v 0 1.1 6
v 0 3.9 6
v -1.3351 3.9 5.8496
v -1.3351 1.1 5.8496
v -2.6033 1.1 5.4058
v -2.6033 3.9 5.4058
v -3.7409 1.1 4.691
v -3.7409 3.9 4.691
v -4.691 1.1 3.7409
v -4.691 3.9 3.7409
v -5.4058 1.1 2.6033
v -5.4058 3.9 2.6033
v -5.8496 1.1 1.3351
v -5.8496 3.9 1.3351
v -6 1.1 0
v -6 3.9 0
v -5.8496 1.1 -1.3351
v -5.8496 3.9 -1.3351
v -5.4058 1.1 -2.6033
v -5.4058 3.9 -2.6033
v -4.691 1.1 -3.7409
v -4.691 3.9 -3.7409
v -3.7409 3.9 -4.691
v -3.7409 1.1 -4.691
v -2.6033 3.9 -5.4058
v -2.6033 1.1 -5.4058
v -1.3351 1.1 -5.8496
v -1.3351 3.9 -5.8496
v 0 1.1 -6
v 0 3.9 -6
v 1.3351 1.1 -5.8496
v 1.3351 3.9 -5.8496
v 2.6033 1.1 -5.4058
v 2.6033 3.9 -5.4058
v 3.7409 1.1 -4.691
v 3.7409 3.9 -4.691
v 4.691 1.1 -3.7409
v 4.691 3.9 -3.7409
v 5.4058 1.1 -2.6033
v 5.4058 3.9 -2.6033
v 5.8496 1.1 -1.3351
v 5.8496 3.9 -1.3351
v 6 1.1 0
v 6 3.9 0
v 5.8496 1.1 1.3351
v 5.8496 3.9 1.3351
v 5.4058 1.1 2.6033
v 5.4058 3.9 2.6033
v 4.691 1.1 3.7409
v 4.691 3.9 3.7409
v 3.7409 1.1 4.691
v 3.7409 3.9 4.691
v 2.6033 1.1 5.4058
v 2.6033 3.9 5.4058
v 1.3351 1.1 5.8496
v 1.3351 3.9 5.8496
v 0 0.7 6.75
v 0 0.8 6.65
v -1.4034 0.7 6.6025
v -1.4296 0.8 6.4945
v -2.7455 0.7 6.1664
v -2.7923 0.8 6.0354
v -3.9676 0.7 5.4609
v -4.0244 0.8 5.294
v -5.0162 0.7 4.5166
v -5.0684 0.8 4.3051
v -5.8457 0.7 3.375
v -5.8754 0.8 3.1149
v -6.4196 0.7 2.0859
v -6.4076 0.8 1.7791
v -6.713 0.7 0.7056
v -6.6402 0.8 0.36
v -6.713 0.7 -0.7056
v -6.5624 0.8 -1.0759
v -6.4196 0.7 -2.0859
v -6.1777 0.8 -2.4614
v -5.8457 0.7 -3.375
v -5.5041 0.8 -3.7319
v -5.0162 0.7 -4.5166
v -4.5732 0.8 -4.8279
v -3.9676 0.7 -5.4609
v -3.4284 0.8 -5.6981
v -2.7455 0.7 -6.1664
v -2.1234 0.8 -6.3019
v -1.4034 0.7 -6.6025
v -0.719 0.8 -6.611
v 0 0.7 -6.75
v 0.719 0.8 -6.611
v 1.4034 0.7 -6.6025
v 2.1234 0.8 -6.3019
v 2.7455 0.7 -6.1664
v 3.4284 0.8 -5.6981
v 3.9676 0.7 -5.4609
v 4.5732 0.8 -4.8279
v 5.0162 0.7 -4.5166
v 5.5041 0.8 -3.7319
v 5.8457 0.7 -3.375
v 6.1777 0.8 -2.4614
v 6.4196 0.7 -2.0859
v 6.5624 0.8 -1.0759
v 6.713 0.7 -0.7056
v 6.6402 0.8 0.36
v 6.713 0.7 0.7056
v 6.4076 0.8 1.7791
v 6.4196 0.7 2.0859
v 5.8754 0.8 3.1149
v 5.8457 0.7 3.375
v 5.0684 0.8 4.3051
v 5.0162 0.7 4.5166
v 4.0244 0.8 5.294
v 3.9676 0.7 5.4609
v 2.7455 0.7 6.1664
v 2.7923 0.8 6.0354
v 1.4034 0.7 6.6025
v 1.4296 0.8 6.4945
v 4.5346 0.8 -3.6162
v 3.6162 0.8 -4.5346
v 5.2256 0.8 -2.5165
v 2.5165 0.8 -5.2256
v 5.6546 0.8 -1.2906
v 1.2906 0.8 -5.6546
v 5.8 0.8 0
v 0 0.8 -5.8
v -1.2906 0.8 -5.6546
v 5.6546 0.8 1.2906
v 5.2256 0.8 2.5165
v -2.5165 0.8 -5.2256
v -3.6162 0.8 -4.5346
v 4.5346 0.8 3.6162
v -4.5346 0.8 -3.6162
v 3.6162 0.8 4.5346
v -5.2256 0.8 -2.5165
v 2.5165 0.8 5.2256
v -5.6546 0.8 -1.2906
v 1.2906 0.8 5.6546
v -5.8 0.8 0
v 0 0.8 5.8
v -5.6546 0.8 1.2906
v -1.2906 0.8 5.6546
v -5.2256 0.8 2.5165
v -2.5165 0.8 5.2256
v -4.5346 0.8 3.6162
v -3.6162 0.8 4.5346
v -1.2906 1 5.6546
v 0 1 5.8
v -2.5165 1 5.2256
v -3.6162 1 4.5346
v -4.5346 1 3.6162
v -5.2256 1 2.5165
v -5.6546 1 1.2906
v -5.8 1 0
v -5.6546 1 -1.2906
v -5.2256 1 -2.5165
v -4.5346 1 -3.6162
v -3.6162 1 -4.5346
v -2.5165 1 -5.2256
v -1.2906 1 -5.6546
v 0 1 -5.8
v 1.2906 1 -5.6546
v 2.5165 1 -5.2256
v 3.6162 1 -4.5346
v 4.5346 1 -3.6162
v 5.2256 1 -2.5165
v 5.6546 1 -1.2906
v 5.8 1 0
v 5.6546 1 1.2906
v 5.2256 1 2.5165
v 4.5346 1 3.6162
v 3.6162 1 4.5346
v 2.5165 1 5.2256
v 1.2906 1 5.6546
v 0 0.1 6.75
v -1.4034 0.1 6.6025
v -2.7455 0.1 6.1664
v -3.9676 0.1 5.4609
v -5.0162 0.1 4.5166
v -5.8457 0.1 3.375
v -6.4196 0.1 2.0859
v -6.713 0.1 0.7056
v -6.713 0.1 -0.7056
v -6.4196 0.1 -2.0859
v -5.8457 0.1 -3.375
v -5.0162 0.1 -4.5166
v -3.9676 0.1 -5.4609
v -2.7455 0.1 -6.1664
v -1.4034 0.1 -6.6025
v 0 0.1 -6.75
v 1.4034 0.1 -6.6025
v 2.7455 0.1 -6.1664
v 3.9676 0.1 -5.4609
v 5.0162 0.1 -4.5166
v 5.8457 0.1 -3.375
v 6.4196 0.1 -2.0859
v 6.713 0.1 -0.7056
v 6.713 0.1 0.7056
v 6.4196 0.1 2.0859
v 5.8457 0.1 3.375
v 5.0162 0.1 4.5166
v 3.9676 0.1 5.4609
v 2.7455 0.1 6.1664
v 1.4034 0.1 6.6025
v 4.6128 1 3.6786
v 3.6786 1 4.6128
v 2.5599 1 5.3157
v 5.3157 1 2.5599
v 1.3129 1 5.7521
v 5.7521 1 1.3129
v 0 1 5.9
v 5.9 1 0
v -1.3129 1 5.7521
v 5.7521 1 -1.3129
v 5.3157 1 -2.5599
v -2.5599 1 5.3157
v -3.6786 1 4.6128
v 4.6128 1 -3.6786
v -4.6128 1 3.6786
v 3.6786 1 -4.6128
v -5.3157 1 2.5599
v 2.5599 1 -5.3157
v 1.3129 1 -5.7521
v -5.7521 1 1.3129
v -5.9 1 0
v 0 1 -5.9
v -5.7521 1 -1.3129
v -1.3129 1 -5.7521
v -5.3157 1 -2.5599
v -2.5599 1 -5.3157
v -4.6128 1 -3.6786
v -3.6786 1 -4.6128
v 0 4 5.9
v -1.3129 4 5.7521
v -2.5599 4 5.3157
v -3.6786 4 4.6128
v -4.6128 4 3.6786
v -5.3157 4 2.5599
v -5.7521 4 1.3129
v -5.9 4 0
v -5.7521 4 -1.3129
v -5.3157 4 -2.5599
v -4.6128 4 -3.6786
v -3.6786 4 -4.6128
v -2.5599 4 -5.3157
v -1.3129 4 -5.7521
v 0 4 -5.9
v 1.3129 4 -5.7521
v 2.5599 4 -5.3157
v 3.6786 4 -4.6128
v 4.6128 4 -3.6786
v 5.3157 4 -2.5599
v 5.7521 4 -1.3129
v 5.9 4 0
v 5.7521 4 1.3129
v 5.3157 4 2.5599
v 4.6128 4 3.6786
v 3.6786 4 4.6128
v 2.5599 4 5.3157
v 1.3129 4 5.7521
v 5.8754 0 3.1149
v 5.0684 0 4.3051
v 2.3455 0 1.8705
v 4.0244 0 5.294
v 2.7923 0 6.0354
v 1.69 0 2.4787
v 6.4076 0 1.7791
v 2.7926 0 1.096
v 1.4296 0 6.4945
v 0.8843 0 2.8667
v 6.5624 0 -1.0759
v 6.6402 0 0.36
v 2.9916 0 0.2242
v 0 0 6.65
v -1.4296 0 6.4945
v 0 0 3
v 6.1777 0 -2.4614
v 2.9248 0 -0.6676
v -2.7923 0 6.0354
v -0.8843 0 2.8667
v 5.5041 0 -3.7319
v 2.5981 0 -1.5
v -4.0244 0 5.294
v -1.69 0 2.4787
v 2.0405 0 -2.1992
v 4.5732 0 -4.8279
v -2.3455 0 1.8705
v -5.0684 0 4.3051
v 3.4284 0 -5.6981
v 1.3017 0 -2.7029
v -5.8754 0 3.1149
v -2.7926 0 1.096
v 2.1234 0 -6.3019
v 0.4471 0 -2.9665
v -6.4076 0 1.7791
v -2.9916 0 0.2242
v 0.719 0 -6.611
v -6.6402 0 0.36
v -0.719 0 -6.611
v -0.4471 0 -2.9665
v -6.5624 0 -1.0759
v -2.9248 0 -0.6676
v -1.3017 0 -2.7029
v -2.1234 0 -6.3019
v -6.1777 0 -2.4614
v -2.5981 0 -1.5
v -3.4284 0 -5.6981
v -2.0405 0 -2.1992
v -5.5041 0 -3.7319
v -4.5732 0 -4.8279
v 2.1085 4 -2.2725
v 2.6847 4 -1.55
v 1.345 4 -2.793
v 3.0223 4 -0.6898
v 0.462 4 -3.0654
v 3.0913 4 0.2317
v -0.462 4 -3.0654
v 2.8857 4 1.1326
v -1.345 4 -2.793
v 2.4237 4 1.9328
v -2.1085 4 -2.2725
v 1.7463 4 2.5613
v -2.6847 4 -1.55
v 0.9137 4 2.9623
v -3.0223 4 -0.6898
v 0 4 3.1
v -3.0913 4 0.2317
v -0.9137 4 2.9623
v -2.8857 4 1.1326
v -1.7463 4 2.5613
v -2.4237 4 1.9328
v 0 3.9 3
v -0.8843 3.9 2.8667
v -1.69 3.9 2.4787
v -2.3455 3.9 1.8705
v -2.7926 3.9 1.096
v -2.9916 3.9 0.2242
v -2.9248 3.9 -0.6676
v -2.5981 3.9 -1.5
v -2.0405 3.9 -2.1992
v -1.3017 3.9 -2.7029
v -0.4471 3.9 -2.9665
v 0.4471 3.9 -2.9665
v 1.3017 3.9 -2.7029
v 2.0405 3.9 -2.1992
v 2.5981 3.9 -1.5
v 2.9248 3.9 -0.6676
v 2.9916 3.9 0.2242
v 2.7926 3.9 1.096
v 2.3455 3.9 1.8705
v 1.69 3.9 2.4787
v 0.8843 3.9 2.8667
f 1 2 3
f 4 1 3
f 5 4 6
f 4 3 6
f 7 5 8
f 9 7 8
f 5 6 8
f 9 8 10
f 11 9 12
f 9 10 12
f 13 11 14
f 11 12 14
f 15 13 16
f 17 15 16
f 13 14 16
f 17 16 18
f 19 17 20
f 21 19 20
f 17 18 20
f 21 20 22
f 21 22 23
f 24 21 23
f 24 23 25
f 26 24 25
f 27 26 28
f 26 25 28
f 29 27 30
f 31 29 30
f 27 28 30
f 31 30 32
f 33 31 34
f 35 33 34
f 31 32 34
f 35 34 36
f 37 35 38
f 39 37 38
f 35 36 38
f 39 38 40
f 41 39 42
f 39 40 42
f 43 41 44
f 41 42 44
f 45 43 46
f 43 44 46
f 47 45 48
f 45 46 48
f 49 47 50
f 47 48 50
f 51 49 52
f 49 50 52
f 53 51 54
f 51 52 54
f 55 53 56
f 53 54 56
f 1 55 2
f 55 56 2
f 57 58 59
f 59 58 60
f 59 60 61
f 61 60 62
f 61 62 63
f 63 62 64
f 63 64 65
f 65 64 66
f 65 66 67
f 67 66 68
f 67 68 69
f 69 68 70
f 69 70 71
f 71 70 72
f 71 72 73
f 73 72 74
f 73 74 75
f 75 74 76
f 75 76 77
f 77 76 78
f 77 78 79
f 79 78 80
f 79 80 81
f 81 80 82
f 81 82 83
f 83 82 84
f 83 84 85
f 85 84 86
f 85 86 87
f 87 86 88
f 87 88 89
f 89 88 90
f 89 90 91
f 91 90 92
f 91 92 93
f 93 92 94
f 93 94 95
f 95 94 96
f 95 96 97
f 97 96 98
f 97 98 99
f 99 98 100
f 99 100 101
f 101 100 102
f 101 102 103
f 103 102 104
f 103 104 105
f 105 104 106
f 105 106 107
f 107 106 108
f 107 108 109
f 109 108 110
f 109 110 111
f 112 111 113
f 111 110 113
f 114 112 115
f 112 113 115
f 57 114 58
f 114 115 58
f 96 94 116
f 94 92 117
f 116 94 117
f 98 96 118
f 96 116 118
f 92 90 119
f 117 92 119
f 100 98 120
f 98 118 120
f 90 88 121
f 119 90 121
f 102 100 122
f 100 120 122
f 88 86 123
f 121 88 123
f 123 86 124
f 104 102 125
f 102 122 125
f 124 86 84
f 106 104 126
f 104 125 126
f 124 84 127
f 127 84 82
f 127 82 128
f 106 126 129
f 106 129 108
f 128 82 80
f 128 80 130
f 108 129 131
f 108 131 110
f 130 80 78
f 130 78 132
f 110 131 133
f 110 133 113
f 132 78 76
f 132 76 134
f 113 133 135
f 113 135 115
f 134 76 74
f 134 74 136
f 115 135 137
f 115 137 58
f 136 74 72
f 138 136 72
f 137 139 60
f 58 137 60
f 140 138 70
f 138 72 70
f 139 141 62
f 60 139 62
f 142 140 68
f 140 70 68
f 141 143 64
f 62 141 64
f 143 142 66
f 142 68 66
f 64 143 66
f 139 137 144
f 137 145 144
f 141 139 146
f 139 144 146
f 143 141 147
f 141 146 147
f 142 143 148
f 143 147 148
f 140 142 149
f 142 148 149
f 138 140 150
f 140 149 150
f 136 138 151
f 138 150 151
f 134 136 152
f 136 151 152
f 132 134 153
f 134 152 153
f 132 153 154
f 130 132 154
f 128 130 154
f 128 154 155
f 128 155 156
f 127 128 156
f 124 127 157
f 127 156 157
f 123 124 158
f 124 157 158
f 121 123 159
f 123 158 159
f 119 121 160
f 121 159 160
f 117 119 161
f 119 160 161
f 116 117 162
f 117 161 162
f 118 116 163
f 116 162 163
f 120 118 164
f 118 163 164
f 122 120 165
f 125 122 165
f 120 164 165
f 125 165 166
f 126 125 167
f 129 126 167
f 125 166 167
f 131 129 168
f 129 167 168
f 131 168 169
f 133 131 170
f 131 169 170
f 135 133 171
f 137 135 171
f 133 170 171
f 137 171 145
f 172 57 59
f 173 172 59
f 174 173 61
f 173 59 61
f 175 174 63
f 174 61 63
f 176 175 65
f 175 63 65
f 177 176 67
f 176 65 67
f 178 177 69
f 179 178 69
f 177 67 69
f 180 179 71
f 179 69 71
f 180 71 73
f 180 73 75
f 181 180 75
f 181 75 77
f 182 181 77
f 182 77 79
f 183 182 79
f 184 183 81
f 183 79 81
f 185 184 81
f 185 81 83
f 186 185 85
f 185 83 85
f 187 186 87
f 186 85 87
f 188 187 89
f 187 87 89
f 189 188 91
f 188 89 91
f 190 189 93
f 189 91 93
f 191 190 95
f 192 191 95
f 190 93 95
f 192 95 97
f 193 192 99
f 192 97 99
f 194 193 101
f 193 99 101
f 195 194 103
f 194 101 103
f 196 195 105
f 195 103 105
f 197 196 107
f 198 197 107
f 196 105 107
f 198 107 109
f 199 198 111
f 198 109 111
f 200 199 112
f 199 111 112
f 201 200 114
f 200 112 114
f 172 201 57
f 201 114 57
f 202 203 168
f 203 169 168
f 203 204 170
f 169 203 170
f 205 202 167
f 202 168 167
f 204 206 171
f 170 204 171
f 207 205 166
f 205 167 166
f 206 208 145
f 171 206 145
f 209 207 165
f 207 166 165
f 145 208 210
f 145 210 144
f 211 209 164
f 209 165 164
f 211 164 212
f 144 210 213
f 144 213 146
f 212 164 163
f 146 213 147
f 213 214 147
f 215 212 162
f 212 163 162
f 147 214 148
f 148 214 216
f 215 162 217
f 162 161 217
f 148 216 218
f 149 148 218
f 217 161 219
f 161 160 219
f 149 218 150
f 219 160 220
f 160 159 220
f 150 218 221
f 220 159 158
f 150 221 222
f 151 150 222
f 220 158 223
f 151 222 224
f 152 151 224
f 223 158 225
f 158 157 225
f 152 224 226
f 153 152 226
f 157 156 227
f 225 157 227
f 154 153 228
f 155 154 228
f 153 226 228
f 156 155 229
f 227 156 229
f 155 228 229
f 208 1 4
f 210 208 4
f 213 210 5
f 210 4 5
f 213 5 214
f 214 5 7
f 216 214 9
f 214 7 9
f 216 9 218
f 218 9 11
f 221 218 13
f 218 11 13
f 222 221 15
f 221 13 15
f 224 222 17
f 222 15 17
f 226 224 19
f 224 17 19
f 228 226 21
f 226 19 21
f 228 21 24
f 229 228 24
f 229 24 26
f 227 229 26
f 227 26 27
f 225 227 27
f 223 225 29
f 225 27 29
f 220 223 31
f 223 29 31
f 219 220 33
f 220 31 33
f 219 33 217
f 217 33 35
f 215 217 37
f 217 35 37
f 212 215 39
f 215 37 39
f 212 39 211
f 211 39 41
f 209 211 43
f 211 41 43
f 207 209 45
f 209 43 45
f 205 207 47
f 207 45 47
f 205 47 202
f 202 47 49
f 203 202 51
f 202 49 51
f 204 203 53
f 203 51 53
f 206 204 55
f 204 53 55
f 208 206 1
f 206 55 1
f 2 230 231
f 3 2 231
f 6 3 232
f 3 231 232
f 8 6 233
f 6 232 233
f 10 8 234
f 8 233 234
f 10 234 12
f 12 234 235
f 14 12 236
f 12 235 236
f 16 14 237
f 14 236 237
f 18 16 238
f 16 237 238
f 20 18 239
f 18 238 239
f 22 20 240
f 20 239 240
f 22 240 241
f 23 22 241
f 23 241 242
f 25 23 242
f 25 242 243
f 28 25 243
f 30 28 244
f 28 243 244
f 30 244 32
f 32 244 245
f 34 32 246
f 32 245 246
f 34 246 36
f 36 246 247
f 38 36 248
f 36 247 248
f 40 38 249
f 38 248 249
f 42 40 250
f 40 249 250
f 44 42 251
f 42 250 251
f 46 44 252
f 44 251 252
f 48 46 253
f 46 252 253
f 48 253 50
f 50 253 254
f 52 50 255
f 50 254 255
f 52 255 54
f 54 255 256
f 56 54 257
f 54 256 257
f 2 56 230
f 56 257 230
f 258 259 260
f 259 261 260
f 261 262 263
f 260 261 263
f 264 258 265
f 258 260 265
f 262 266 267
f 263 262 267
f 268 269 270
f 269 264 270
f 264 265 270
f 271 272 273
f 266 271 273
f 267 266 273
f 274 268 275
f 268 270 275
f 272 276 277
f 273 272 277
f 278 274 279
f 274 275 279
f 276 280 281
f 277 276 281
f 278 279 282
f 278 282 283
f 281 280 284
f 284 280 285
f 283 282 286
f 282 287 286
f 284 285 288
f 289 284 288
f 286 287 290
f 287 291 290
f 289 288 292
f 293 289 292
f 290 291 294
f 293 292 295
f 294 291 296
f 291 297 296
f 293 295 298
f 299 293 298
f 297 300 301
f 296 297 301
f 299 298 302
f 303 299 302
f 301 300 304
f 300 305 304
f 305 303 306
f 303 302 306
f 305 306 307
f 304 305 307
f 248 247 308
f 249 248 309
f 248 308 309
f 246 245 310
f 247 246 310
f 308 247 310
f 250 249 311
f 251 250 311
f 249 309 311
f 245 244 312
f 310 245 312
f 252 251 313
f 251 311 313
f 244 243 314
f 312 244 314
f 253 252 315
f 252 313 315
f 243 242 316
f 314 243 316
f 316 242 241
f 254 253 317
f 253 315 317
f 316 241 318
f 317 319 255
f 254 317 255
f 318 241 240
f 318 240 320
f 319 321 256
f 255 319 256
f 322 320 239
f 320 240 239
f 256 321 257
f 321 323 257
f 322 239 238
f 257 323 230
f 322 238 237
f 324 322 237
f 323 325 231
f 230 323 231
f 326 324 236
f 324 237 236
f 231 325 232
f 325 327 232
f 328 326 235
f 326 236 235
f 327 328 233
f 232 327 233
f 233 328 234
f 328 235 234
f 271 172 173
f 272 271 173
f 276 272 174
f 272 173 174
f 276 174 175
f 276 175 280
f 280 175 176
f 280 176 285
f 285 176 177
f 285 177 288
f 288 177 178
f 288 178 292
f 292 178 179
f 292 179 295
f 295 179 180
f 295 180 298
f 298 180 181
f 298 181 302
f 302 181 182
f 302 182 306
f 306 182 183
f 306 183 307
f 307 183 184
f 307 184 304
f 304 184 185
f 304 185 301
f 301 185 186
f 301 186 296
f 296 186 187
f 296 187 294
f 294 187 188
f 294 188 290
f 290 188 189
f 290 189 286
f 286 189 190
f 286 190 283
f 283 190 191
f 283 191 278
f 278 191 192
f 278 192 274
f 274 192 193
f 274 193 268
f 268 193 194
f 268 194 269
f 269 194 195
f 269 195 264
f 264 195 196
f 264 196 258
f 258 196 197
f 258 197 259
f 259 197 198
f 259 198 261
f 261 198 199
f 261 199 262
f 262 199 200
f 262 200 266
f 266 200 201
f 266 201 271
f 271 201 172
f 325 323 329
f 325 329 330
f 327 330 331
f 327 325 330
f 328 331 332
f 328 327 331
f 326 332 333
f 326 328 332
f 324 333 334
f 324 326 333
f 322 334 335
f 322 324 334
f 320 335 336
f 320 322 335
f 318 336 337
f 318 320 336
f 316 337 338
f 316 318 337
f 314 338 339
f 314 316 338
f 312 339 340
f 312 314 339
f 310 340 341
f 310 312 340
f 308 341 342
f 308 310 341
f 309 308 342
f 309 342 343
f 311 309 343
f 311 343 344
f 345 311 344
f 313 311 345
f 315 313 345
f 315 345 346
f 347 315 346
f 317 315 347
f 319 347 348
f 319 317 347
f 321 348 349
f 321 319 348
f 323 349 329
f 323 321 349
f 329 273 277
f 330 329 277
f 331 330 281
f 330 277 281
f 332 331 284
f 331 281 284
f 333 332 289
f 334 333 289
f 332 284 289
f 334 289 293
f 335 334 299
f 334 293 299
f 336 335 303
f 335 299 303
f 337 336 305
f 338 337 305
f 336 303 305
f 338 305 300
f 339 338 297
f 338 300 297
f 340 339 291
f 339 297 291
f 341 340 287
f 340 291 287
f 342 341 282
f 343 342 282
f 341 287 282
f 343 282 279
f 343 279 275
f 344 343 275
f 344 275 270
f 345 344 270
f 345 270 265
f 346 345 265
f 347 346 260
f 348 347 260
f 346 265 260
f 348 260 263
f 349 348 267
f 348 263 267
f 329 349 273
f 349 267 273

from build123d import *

# Parameters (mm, degrees)
CHAMFER_2_SIZE = 0.1


with BuildPart() as part:
    # 草图2 → 旋转1 (revolve)
    with BuildSketch(Plane.XY, mode=Mode.PRIVATE) as revolve_1_sk:
        Polygon((3, 4), (3, 0), (6.75, 0), (6.75, 0.8), (5.8, 0.8), (5.8, 1), (6, 1), (6, 4), align=None)
    revolve(revolve_1_sk.sketch.rotate(Axis((0, 4, 0), (0, -1, 0)), 90), axis=Axis((0, 4, 0), (0, -1, 0)))

    # 倒角2
    chamfer_2_edges = [part.edges().sort_by_distance(p)[0] for p in [
        (0, 0, -6.75),
        (0, 4, -3),
        (0, 4, -6),
        (0, 1, -6),
        (0, 0.8, -6.75),
    ]]
    chamfer(chamfer_2_edges, length=CHAMFER_2_SIZE)


solid = part.part
